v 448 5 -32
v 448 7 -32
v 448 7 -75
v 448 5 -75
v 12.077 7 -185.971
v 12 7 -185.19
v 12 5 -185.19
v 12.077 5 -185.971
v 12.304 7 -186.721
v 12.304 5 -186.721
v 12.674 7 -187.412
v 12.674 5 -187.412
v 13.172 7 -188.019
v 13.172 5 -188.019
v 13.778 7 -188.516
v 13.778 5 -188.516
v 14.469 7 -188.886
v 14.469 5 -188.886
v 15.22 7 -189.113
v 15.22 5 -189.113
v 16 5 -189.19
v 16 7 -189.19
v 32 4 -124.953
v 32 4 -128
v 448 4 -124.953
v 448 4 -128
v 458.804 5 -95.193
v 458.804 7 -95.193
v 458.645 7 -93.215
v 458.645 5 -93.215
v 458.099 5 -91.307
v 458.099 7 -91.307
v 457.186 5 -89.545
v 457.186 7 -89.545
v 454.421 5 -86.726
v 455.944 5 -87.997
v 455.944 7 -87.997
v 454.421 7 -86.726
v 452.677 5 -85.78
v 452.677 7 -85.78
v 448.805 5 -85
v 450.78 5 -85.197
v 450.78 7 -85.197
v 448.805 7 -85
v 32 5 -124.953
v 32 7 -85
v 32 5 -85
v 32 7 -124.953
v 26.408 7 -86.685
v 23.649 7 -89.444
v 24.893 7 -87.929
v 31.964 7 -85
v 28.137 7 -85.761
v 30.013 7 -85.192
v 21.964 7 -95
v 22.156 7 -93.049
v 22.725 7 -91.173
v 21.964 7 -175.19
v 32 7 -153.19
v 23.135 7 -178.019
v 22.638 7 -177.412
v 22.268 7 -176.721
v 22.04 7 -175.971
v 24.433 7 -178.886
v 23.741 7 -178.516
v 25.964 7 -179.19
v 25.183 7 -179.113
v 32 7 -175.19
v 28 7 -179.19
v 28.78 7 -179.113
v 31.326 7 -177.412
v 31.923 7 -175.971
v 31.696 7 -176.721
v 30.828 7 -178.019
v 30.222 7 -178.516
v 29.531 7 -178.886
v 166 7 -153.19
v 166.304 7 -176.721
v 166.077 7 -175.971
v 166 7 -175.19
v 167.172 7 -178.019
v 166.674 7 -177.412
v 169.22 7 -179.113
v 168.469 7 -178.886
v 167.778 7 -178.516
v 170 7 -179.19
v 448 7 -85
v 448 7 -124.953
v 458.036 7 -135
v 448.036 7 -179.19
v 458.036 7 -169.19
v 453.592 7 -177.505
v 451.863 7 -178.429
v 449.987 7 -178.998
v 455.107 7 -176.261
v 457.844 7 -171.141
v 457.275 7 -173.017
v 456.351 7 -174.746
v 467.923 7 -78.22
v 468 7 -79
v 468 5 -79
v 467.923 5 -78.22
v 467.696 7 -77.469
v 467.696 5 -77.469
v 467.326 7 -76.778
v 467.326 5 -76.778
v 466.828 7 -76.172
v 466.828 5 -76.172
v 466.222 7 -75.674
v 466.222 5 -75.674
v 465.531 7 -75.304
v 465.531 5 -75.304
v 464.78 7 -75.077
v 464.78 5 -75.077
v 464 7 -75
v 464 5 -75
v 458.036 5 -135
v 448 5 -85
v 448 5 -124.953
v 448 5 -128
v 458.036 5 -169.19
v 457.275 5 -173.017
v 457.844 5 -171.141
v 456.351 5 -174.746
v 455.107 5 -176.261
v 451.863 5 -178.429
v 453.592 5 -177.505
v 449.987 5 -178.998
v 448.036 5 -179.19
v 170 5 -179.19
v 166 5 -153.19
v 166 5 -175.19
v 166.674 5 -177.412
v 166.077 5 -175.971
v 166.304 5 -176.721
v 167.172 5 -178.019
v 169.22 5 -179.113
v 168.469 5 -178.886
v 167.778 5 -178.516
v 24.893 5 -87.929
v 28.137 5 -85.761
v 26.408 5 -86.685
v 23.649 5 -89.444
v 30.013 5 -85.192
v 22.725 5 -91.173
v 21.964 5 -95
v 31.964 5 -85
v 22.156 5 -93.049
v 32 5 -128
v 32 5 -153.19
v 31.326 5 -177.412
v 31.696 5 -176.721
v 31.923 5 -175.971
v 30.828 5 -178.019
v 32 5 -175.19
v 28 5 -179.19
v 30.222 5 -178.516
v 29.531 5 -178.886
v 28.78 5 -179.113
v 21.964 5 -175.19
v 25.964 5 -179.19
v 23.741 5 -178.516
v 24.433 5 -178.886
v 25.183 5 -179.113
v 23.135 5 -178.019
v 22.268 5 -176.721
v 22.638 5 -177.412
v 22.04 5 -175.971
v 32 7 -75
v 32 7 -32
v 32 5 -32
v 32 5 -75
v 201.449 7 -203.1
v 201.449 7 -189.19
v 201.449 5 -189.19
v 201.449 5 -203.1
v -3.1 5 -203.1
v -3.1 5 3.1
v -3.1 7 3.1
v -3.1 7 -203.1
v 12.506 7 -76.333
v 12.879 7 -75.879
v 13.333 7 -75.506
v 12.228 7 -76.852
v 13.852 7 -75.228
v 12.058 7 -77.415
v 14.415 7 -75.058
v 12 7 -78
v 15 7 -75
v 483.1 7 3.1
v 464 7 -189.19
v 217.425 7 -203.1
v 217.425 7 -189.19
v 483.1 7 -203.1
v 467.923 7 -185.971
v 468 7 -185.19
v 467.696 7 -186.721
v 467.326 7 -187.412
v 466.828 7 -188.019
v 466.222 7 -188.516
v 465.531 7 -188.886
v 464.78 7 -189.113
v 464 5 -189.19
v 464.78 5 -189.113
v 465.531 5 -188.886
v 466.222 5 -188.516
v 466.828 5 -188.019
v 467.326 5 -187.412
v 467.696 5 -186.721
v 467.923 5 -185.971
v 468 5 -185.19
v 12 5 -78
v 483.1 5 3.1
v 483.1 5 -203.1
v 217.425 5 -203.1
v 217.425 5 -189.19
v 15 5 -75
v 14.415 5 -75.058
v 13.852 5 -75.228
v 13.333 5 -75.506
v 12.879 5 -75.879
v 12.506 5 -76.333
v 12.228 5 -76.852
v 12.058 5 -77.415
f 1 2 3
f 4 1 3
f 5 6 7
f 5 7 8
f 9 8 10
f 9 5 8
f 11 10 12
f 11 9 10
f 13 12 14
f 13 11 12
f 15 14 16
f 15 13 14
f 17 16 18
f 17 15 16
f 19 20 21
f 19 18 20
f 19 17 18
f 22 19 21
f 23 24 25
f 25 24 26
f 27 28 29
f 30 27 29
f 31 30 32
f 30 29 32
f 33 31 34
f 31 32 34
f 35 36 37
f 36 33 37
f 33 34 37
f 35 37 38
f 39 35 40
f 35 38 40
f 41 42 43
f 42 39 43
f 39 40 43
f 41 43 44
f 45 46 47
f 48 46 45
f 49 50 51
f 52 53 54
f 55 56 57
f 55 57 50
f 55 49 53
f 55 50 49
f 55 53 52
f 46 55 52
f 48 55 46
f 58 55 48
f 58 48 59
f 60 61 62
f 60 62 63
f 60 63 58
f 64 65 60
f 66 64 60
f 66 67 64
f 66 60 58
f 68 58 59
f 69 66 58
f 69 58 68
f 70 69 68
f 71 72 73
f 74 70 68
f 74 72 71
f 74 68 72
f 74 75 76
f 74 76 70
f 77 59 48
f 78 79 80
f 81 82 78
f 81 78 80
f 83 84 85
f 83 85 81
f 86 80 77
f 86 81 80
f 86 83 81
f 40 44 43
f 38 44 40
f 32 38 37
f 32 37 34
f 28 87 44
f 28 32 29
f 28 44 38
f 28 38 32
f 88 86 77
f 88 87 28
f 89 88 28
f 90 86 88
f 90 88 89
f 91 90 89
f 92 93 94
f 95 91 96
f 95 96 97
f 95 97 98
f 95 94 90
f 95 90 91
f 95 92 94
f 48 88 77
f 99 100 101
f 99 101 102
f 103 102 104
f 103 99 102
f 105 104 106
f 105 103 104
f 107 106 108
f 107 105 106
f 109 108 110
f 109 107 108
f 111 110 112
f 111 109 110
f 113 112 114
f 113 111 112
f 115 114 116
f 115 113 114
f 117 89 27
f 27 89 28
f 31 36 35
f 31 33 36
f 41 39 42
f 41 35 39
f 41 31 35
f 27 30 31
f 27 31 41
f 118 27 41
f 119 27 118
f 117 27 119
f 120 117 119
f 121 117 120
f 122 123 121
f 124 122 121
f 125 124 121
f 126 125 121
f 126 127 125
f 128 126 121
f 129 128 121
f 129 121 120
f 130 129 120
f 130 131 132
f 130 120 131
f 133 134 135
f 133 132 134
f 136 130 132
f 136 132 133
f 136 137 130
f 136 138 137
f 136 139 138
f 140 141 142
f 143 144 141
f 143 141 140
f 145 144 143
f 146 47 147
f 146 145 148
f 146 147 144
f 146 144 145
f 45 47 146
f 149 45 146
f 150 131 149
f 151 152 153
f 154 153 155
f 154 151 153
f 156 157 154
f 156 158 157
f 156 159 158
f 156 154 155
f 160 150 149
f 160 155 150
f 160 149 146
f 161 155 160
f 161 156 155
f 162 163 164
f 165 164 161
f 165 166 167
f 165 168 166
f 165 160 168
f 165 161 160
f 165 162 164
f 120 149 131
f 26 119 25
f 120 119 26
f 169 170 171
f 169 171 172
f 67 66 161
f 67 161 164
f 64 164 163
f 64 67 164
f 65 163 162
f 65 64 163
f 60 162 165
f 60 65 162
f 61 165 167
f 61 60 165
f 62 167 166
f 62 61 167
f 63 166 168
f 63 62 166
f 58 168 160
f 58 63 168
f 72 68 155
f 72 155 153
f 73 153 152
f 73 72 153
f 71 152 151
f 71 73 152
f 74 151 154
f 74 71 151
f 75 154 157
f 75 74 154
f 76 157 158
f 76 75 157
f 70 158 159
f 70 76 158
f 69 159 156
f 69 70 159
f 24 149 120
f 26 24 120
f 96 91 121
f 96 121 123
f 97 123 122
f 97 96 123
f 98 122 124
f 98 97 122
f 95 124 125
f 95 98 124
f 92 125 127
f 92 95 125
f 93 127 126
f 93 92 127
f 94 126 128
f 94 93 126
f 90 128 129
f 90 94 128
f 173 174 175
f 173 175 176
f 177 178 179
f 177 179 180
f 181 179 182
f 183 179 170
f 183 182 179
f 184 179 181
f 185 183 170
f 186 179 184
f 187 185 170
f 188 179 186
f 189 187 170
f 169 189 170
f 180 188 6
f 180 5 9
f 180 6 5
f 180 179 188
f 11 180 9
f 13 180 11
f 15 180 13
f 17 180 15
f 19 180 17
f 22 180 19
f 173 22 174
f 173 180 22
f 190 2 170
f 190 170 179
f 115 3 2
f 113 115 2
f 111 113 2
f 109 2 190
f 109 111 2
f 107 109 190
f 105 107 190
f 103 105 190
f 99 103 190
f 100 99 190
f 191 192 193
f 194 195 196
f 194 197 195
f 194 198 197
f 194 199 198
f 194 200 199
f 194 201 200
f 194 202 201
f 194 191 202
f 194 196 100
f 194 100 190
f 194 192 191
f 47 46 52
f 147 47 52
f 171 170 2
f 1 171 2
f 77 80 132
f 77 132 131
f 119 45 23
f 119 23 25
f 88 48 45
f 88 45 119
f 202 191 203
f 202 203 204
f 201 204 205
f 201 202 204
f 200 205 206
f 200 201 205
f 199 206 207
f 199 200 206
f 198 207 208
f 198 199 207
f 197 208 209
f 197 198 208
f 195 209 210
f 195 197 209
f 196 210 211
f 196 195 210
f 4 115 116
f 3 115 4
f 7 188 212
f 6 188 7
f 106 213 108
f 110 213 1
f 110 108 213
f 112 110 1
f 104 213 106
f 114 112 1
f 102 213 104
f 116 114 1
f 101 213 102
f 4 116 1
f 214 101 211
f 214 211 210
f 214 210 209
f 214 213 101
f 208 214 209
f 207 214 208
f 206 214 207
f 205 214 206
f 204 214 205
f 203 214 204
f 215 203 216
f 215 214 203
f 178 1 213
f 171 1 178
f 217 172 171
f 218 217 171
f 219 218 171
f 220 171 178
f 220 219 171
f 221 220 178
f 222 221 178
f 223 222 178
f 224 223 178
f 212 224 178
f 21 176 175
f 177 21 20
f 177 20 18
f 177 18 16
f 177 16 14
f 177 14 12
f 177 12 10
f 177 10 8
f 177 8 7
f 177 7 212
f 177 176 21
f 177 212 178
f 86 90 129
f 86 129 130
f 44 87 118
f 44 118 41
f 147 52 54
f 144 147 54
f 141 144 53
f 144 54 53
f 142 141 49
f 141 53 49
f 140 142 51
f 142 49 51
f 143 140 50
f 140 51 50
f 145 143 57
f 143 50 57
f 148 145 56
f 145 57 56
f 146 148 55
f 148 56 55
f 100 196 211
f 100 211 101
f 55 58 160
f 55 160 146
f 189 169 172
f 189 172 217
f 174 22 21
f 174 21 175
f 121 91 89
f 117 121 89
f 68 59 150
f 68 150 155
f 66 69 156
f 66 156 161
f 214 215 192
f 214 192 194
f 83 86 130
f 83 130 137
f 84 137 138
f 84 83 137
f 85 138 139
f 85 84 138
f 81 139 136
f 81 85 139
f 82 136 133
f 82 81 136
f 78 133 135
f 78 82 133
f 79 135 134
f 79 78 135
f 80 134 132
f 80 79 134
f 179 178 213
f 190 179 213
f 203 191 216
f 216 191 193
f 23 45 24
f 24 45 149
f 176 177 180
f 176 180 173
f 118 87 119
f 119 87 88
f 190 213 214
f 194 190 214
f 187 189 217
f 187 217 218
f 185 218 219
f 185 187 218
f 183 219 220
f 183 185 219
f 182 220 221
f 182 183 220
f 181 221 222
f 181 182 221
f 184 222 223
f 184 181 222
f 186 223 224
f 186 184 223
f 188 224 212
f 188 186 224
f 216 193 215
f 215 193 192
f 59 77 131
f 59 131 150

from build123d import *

# Parameters (mm, degrees)
CROQUIS1_W              = 486.2
CROQUIS1_H              = 206.2
CROQUIS1_W_2            = 480
CROQUIS1_H_2            = 200
SALIENTE_EXTRUIR1_DEPTH = 12
CROQUIS3_W              = 486.2
CROQUIS3_H              = 206.2
CROQUIS3_W_2            = 480
CROQUIS3_H_2            = 200
CORTAR_EXTRUIR1_DEPTH   = 5
CORTAR_EXTRUIR3_DEPTH   = 8
CROQUIS4_W              = 20
CROQUIS4_H              = 6
CORTAR_EXTRUIR4_DEPTH   = 3
CORTAR_EXTRUIR5_DEPTH   = 2
CROQUIS7_W              = 721.947089947
CROQUIS7_H              = 359.419856831
CORTAR_EXTRUIR6_DEPTH   = 10
CROQUIS8_W              = 416
CROQUIS8_H              = 96
CORTAR_EXTRUIR7_DEPTH   = 10
CROQUIS9_W              = 531.904745737
CROQUIS9_H              = 246.353411826
CORTAR_EXTRUIR9_DEPTH   = 10
CROQUIS10_W             = 531.904745737
CROQUIS10_H             = 246.353411826
CORTAR_EXTRUIR10_DEPTH  = 10
CROQUIS11_W             = 531.904745737
CROQUIS11_H             = 246.353411826
CORTAR_EXTRUIR11_DEPTH  = 10
CROQUIS12_W             = 416
CROQUIS12_H             = 3.047420062
SALIENTE_EXTRUIR2_DEPTH = 3


with BuildPart() as part:
    # Croquis1 → Saliente-Extruir1 (new body)
    with BuildSketch(Plane(origin=(0, 0, 0), x_dir=(1, 0, 0), z_dir=(0, 1, 0))):
        with Locations((240, 100)):
            Rectangle(CROQUIS1_W, CROQUIS1_H)
        with Locations((240, 100)):
            Rectangle(CROQUIS1_W_2, CROQUIS1_H_2, mode=Mode.SUBTRACT)
        with Locations((240, 100)):
            Rectangle(CROQUIS1_W_2, CROQUIS1_H_2)
    extrude(amount=SALIENTE_EXTRUIR1_DEPTH)

    # Croquis3 → Cortar-Extruir1 (cut)
    with BuildSketch(Plane(origin=(0, 12, 0), x_dir=(1, 0, 0), z_dir=(0, 1, 0))):
        with Locations((240, 100)):
            Rectangle(CROQUIS3_W, CROQUIS3_H)
        with Locations((240, 100)):
            Rectangle(CROQUIS3_W_2, CROQUIS3_H_2, mode=Mode.SUBTRACT)
    extrude(amount=-CORTAR_EXTRUIR1_DEPTH, mode=Mode.SUBTRACT)

    # Croquis2 → Cortar-Extruir3 (cut)
    with BuildSketch(Plane(origin=(0, 12, 0), x_dir=(1, 0, 0), z_dir=(0, 1, 0))):
        with BuildLine():
            ThreePointArc((16, 189.1902066), (13.171572875, 188.018633725), (12, 185.1902066))
            Line((12, 185.1902066), (12, 78))
            ThreePointArc((12, 78), (12.878679656, 75.878679656), (15, 75))
            Line((15, 75), (32, 75))
            Line((32, 75), (32, 32))
            Line((32, 32), (448, 32))
            Line((448, 32), (448, 75))
            Line((448, 75), (464, 75))
            ThreePointArc((464, 75), (466.828427125, 76.171572875), (468, 79))
            Line((468, 79), (468, 185.1902066))
            ThreePointArc((468, 185.1902066), (466.828427125, 188.018633725), (464, 189.1902066))
            Line((464, 189.1902066), (217.424703227, 189.1902066))
            Line((217.424703227, 189.1902066), (217.424703227, 203.1))
            Line((217.424703227, 203.1), (201.44869327, 203.1))
            Line((201.44869327, 203.1), (201.44869327, 189.1902066))
            Line((201.44869327, 189.1902066), (16, 189.1902066))
        make_face()
        with BuildLine():
            Line((32, 85), (31.963588191, 85))
            ThreePointArc((31.963588191, 85), (24.892520379, 87.928932188), (21.963588191, 95))
            Line((21.963588191, 95), (21.963588191, 175.1902066))
            ThreePointArc((21.963588191, 175.1902066), (23.135161066, 178.018633725), (25.963588191, 179.1902066))
            Line((25.963588191, 179.1902066), (28, 179.1902066))
            ThreePointArc((28, 179.1902066), (30.828427125, 178.018633725), (32, 175.1902066))
            Line((32, 175.1902066), (32, 153.1902066))
            Line((32, 153.1902066), (166, 153.1902066))
            Line((166, 153.1902066), (166, 175.1902066))
            ThreePointArc((166, 175.1902066), (167.171572875, 178.018633725), (170, 179.1902066))
            Line((170, 179.1902066), (448.036411809, 179.1902066))
            ThreePointArc((448.036411809, 179.1902066), (455.107479621, 176.261274412), (458.036411809, 169.1902066))
            Line((458.036411809, 169.1902066), (458.036411809, 135.000000034))
            Line((458.036411809, 135.000000034), (458.803569043, 95.19268186))
            ThreePointArc((458.803569043, 95.19268186), (455.944291637, 87.997386866), (448.80542553, 85))
            Line((448.80542553, 85), (448, 85))
            Line((448, 85), (448, 128))
            Line((448, 128), (32, 128))
            Line((32, 128), (32, 85))
        make_face(mode=Mode.SUBTRACT)
    extrude(amount=-CORTAR_EXTRUIR3_DEPTH, mode=Mode.SUBTRACT)

    # Croquis4 → Cortar-Extruir4 (cut)
    with BuildSketch(Plane(origin=(0, 12, 0), x_dir=(1, 0, 0), z_dir=(0, 1, 0))):
        with BuildLine():
            Line((31.963588191, 85), (32, 128))
            Line((32, 128), (32, 134))
            Line((32, 134), (32, 147.1902066))
            Line((32, 147.1902066), (32, 153.1902066))
            Line((32, 153.1902066), (32, 175.1902066))
            ThreePointArc((32, 175.1902066), (30.828427125, 178.018633725), (28, 179.1902066))
            Line((28, 179.1902066), (25.963588191, 179.1902066))
            ThreePointArc((25.963588191, 179.1902066), (23.135161066, 178.018633725), (21.963588191, 175.1902066))
            Line((21.963588191, 175.1902066), (21.963588191, 95))
            ThreePointArc((21.963588191, 95), (24.892520379, 87.928932188), (31.963588191, 85))
        make_face()
        with Locations((42, 131)):
            Rectangle(CROQUIS4_W, CROQUIS4_H)
        with Locations((42, 150.1902066)):
            Rectangle(CROQUIS4_W, CROQUIS4_H)
        with BuildLine():
            ThreePointArc((12, 78), (12.878679656, 75.878679656), (15, 75))
            Line((15, 75), (32, 75))
            Line((32, 75), (32, 69))
            Line((32, 69), (6, 69))
            Line((6, 69), (6, 80))
            Line((6, 80), (6, 195.1902066))
            Line((6, 195.1902066), (16, 195.1902066))
            Line((16, 195.1902066), (32, 195.1902066))
            Line((32, 195.1902066), (32, 189.1902066))
            Line((32, 189.1902066), (16, 189.1902066))
            ThreePointArc((16, 189.1902066), (13.171572875, 188.018633725), (12, 185.1902066))
            Line((12, 185.1902066), (12, 80))
            Line((12, 80), (12, 78))
        make_face()
        with Locations((42, 192.1902066)):
            Rectangle(CROQUIS4_W, CROQUIS4_H)
        with Locations((42, 29)):
            Rectangle(CROQUIS4_W, CROQUIS4_H)
        with Locations((156, 192.1902066)):
            Rectangle(CROQUIS4_W, CROQUIS4_H)
        with Locations((156, 150.1902066)):
            Rectangle(CROQUIS4_W, CROQUIS4_H)
        with BuildLine():
            Line((166, 147.1902066), (448, 147.1902066))
            Line((448, 147.1902066), (458.036411809, 147.1902066))
            Line((458.036411809, 147.1902066), (458.036411809, 169.1902066))
            ThreePointArc((458.036411809, 169.1902066), (455.107479621, 176.261274412), (448.036411809, 179.1902066))
            Line((448.036411809, 179.1902066), (170, 179.1902066))
            ThreePointArc((170, 179.1902066), (167.171572875, 178.018633725), (166, 175.1902066))
            Line((166, 175.1902066), (166, 153.1902066))
            Line((166, 153.1902066), (166, 147.1902066))
        make_face()
        with BuildLine():
            Line((458.036411809, 169.1902066), (458.036411809, 147.1902066))
            Line((458.036411809, 147.1902066), (474, 147.1902066))
            Line((474, 147.1902066), (474, 195.1902066))
            Line((474, 195.1902066), (166, 195.1902066))
            Line((166, 195.1902066), (166, 189.1902066))
            Line((166, 189.1902066), (166, 175.1902066))
            ThreePointArc((166, 175.1902066), (167.171572875, 178.018633725), (170, 179.1902066))
            Line((170, 179.1902066), (448.036411809, 179.1902066))
            ThreePointArc((448.036411809, 179.1902066), (455.107479621, 176.261274412), (458.036411809, 169.1902066))
        make_face()
        with BuildLine():
            Line((448.80542553, 85), (448, 85))
            Line((448, 85), (448, 69))
            Line((448, 69), (474, 69))
            Line((474, 69), (474, 147.1902066))
            Line((474, 147.1902066), (458.036411809, 147.1902066))
            Line((458.036411809, 147.1902066), (458.036411809, 135.000000034))
            Line((458.036411809, 135.000000034), (458.803569043, 95.19268186))
            ThreePointArc((458.803569043, 95.19268186), (455.944291637, 87.997386866), (448.80542553, 85))
        make_face()
        with Locations((438, 131)):
            Rectangle(CROQUIS4_W, CROQUIS4_H)
        with Locations((438, 29)):
            Rectangle(CROQUIS4_W, CROQUIS4_H)
        with BuildLine():
            Line((448, 134), (448, 128))
            Line((448, 128), (448, 85))
            Line((448, 85), (448.80542553, 85))
            ThreePointArc((448.80542553, 85), (455.944291637, 87.997386866), (458.803569043, 95.19268186))
            Line((458.803569043, 95.19268186), (458.036411809, 135.000000034))
            Line((458.036411809, 135.000000034), (458.036411809, 147.1902066))
            Line((458.036411809, 147.1902066), (448, 147.1902066))
            Line((448, 147.1902066), (448, 134))
        make_face()
    extrude(amount=-CORTAR_EXTRUIR4_DEPTH, mode=Mode.SUBTRACT)

    # Croquis5 → Cortar-Extruir5 (cut)
    with BuildSketch(Plane(origin=(0, 4, 0), x_dir=(1, 0, 0), z_dir=(0, 1, 0))):
        with BuildLine():
            Line((32.046028397, 84.926485337), (32, 75))
            Line((32, 75), (15, 75))
            ThreePointArc((15, 75), (12.878679656, 75.878679656), (12, 78))
            Line((12, 78), (12, 185.1902066))
            ThreePointArc((12, 185.1902066), (13.171572875, 188.018633725), (16, 189.1902066))
            Line((16, 189.1902066), (201.44869327, 189.1902066))
            Line((201.44869327, 189.1902066), (201.44869327, 203.1))
            Line((201.44869327, 203.1), (217.424703227, 203.1))
            Line((217.424703227, 203.1), (217.424703227, 189.1902066))
            Line((217.424703227, 189.1902066), (464, 189.1902066))
            ThreePointArc((464, 189.1902066), (466.828427125, 188.018633725), (468, 185.1902066))
            Line((468, 185.1902066), (468, 79))
            ThreePointArc((468, 79), (466.828427125, 76.171572875), (464, 75))
            Line((464, 75), (448, 75))
            Line((448, 75), (448, 85))
            Line((448, 85), (448.80542553, 85))
            ThreePointArc((448.80542553, 85), (455.917657262, 88.023512896), (458.803569043, 95.19268186))
            Line((458.803569043, 95.19268186), (458.036411809, 169.1902066))
            ThreePointArc((458.036411809, 169.1902066), (455.107479621, 176.261274412), (448.036411809, 179.1902066))
            Line((448.036411809, 179.1902066), (170, 179.1902066))
            ThreePointArc((170, 179.1902066), (167.171572875, 178.018633725), (166, 175.1902066))
            Line((166, 175.1902066), (166, 153.1902066))
            Line((166, 153.1902066), (32, 153.1902066))
            Line((32, 153.1902066), (32, 175.1902066))
            ThreePointArc((32, 175.1902066), (30.828427125, 178.018633725), (28, 179.1902066))
            Line((28, 179.1902066), (25.963588191, 179.1902066))
            ThreePointArc((25.963588191, 179.1902066), (23.135161066, 178.018633725), (21.963588191, 175.1902066))
            Line((21.963588191, 175.1902066), (21.963588191, 95))
            ThreePointArc((21.963588191, 95), (24.91720844, 87.873793117), (32.046028397, 84.926485337))
        make_face()
    extrude(amount=-CORTAR_EXTRUIR5_DEPTH, mode=Mode.SUBTRACT)

    # Croquis7 → Cortar-Extruir6 (cut)
    with BuildSketch(Plane(origin=(0, 2, 0), x_dir=(1, 0, 0), z_dir=(0, 1, 0))):
        with Locations((149.368191722, 161.470369199)):
            Rectangle(CROQUIS7_W, CROQUIS7_H)
    extrude(amount=-CORTAR_EXTRUIR6_DEPTH, mode=Mode.SUBTRACT)

    # Croquis8 → Cortar-Extruir7 (cut)
    with BuildSketch(Plane(origin=(0, 4, 0), x_dir=(1, 0, 0), z_dir=(0, 1, 0))):
        with Locations((240, 80)):
            Rectangle(CROQUIS8_W, CROQUIS8_H)
    extrude(amount=-CORTAR_EXTRUIR7_DEPTH, mode=Mode.SUBTRACT)


with BuildPart() as cortar_extruir7_piece_1:
    # of the separate pieces the step leaves, piece 1, a body of its own (cortar_extruir7_pieces)
    add(part.part.solids().sort_by_distance((483.1, 2, 3.1))[0])


with BuildPart() as cortar_extruir7_piece_2:
    # of the separate pieces the step leaves, piece 2, a body of its own (cortar_extruir7_pieces)
    add(part.part.solids().sort_by_distance((32, 2, -128))[0])


with BuildPart() as cortar_extruir9_tool:
    # Croquis9 → Cortar-Extruir9 (new body)
    with BuildSketch(Plane(origin=(0, 9, 0), x_dir=(1, 0, 0), z_dir=(0, 1, 0))):
        with Locations((247.004349215, 106.418772052)):
            Rectangle(CROQUIS9_W, CROQUIS9_H)
    extrude(amount=CORTAR_EXTRUIR9_DEPTH)


with BuildPart() as cortar_extruir7_piece_1_1:
    add(cortar_extruir7_piece_1.part)

    # Cortar-Extruir9: cut by cortar_extruir9_tool
    add(cortar_extruir9_tool.part, mode=Mode.SUBTRACT)


with BuildPart() as cortar_extruir7_piece_2_1:
    add(cortar_extruir7_piece_2.part)

    # Cortar-Extruir9: cut by cortar_extruir9_tool
    add(cortar_extruir9_tool.part, mode=Mode.SUBTRACT)


with BuildPart() as cortar_extruir10_tool:
    # Croquis10 → Cortar-Extruir10 (new body)
    with BuildSketch(Plane(origin=(0, 7, 0), x_dir=(1, 0, 0), z_dir=(0, 1, 0))):
        with Locations((247.004349215, 106.418772052)):
            Rectangle(CROQUIS10_W, CROQUIS10_H)
    extrude(amount=CORTAR_EXTRUIR10_DEPTH)


with BuildPart() as cortar_extruir7_piece_1_2:
    add(cortar_extruir7_piece_1_1.part)

    # Cortar-Extruir10: cut by cortar_extruir10_tool
    add(cortar_extruir10_tool.part, mode=Mode.SUBTRACT)


with BuildPart() as cortar_extruir7_piece_2_2:
    add(cortar_extruir7_piece_2_1.part)

    # Cortar-Extruir10: cut by cortar_extruir10_tool
    add(cortar_extruir10_tool.part, mode=Mode.SUBTRACT)


with BuildPart() as cortar_extruir11_tool:
    # Croquis11 → Cortar-Extruir11 (new body)
    with BuildSketch(Plane(origin=(0, 5, 0), x_dir=(-1, 0, 0), z_dir=(0, -1, 0))):
        with Locations((-247.004349215, 106.418772052)):
            Rectangle(CROQUIS11_W, CROQUIS11_H)
    extrude(amount=CORTAR_EXTRUIR11_DEPTH)


with BuildPart() as cortar_extruir7_piece_1_3:
    add(cortar_extruir7_piece_1_2.part)

    # Cortar-Extruir11: cut by cortar_extruir11_tool
    add(cortar_extruir11_tool.part, mode=Mode.SUBTRACT)


with BuildPart() as cortar_extruir7_piece_2_3:
    add(cortar_extruir7_piece_2_2.part)

    # Cortar-Extruir11: cut by cortar_extruir11_tool
    add(cortar_extruir11_tool.part, mode=Mode.SUBTRACT)

    # Croquis12 → Saliente-Extruir2 (add)
    with BuildSketch(Plane(origin=(0, 7, 0), x_dir=(1, 0, 0), z_dir=(0, 1, 0))):
        with Locations((240, 126.476289969)):
            Rectangle(CROQUIS12_W, CROQUIS12_H)
    extrude(amount=-SALIENTE_EXTRUIR2_DEPTH)


solid = Compound([cortar_extruir7_piece_1_3.part, cortar_extruir7_piece_2_3.part])
